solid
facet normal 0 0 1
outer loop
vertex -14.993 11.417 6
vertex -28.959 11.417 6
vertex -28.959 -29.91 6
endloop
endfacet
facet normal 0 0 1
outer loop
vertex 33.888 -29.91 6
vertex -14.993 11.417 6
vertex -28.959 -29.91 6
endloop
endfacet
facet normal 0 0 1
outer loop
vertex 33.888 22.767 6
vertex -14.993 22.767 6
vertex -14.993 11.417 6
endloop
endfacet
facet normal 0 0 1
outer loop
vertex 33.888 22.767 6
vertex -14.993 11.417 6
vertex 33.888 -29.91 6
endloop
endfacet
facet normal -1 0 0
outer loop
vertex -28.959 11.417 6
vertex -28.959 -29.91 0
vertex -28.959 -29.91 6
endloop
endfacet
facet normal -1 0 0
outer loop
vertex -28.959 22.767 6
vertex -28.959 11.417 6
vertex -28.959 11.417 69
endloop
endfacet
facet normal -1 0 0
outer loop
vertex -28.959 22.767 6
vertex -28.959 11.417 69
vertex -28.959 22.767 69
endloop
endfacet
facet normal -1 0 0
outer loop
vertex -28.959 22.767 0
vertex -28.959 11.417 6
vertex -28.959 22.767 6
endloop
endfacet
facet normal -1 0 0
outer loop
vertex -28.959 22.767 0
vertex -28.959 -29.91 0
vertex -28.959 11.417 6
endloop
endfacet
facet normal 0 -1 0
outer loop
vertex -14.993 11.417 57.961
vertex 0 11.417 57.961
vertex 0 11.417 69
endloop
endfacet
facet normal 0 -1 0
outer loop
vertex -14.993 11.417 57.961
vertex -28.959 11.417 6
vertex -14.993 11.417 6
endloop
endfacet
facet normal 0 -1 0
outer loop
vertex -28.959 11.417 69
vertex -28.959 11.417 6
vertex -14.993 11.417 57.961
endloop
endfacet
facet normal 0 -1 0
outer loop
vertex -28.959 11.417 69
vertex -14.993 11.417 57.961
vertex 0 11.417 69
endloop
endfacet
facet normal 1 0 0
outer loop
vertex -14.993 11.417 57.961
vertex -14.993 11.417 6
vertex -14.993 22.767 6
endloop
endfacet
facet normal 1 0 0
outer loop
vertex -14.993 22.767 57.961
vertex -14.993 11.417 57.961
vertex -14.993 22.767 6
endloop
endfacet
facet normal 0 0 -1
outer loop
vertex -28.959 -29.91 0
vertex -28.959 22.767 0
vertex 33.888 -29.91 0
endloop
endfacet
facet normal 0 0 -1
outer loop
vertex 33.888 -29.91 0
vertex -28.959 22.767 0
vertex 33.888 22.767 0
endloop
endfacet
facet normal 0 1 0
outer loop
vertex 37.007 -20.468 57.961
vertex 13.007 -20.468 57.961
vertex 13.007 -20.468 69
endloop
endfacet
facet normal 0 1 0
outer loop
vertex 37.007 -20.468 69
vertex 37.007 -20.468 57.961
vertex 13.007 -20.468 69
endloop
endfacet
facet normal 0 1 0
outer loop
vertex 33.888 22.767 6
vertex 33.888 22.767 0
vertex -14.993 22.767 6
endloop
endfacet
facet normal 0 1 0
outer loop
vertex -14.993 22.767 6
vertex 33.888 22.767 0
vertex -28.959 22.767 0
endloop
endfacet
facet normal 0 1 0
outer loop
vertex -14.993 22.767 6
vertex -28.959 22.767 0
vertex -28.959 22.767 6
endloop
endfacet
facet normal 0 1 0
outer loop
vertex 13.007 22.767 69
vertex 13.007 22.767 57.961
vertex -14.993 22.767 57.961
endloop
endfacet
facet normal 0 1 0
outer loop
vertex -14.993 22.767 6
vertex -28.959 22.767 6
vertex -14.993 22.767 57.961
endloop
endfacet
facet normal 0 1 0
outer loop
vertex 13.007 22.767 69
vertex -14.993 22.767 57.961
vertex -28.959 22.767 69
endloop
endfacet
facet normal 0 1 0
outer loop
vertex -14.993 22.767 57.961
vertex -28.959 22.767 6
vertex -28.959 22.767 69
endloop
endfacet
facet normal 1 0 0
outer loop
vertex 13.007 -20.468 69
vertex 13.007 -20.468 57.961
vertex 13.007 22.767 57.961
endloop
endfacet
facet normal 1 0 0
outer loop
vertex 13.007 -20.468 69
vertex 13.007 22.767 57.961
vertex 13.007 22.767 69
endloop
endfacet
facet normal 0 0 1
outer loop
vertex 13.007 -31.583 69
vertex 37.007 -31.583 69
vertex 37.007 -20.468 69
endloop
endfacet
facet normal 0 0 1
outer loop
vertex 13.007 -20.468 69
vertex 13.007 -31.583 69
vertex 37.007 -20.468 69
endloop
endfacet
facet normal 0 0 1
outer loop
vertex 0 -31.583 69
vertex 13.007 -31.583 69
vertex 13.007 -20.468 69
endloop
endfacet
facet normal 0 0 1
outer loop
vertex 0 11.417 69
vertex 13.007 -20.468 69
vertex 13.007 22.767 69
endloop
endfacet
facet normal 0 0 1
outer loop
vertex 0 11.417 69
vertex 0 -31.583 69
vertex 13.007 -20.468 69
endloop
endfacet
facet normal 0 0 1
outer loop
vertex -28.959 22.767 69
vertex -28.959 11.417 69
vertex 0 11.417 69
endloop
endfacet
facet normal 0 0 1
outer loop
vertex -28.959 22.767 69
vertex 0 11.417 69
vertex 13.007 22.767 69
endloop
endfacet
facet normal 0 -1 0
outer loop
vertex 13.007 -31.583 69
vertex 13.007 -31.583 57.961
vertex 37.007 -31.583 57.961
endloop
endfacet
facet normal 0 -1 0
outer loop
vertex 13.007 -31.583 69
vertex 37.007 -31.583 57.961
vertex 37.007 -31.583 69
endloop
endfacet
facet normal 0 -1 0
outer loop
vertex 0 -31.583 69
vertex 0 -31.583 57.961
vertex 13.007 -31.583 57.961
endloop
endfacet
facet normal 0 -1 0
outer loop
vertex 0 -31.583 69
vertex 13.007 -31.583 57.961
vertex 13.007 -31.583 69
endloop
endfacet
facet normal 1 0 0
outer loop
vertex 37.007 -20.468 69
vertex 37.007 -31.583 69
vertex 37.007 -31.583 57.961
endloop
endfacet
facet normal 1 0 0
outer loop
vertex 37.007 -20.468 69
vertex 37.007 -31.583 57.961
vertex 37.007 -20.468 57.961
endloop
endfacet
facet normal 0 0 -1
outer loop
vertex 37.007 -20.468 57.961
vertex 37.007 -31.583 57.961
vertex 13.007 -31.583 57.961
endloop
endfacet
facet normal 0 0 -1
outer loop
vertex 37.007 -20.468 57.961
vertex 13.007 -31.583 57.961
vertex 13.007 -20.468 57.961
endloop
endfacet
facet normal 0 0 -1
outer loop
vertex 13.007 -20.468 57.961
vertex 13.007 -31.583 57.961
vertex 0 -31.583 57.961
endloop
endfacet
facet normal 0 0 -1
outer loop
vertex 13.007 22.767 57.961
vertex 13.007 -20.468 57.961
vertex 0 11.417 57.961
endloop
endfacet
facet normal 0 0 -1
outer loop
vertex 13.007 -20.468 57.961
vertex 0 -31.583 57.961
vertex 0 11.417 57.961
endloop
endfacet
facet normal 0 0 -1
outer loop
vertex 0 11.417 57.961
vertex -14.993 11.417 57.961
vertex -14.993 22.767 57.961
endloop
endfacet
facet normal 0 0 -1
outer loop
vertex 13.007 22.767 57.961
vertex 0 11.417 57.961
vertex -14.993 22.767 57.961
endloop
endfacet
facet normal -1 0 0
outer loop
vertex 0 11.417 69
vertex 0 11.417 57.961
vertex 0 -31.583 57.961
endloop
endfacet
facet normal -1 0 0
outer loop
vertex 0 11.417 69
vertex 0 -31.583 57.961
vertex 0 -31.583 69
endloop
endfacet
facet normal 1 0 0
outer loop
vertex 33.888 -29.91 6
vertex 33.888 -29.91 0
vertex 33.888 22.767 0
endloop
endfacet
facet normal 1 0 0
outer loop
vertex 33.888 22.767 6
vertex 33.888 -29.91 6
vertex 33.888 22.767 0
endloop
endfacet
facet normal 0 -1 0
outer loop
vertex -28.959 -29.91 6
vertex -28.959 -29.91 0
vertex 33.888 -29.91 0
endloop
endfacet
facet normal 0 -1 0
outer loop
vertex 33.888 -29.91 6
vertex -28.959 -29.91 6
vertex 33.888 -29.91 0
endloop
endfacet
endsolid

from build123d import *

# Parameters (mm, degrees)
F0_W     = 62.8466829658
F0_H     = 52.6766888797
F1_DEPTH = 6
F2_W     = 13.9663396403
F2_H     = 11.3499658182
F3_DEPTH = 63
F4_W     = 11.3499658182
F4_H     = 11.0394264162
F5_DEPTH = 28
F6_W     = 13.0074043497
F6_H     = 11.0394264162
F7_DEPTH = 43
F8_W     = 11.1150065735
F8_H     = 11.0394264162
F9_DEPTH = 24


with BuildPart() as f1:
    # F0 (on Top) → F1 (new body)
    with BuildSketch(Plane.XY):
        with Locations((2.4644061923, -3.5718083382)):
            Rectangle(F0_W, F0_H)
    extrude(amount=F1_DEPTH)

    # F2 (on face) → F3 (join)
    with BuildSketch(Plane.XY.offset(6)):
        with Locations((-21.9757654704, 17.0915531926)):
            Rectangle(F2_W, F2_H)
    extrude(amount=F3_DEPTH)

    # F4 (on face) → F5 (join)
    with BuildSketch(Plane.YZ.offset(-14.9925956503)):
        with Locations((17.0915531926, 63.4802867919)):
            Rectangle(F4_W, F4_H)
    extrude(amount=F5_DEPTH)

    # F6 (on face) → F7 (join)
    with BuildSketch(Plane.XZ.offset(-11.4165702835)):
        with Locations((6.5037021749, 63.4802867919)):
            Rectangle(F6_W, F6_H)
    extrude(amount=F7_DEPTH)

    # F8 (on face) → F9 (join)
    with BuildSketch(Plane.YZ.offset(13.0074043497)):
        with Locations((-26.0259264298, 63.4802867919)):
            Rectangle(F8_W, F8_H)
    extrude(amount=F9_DEPTH)


solid = f1.part
